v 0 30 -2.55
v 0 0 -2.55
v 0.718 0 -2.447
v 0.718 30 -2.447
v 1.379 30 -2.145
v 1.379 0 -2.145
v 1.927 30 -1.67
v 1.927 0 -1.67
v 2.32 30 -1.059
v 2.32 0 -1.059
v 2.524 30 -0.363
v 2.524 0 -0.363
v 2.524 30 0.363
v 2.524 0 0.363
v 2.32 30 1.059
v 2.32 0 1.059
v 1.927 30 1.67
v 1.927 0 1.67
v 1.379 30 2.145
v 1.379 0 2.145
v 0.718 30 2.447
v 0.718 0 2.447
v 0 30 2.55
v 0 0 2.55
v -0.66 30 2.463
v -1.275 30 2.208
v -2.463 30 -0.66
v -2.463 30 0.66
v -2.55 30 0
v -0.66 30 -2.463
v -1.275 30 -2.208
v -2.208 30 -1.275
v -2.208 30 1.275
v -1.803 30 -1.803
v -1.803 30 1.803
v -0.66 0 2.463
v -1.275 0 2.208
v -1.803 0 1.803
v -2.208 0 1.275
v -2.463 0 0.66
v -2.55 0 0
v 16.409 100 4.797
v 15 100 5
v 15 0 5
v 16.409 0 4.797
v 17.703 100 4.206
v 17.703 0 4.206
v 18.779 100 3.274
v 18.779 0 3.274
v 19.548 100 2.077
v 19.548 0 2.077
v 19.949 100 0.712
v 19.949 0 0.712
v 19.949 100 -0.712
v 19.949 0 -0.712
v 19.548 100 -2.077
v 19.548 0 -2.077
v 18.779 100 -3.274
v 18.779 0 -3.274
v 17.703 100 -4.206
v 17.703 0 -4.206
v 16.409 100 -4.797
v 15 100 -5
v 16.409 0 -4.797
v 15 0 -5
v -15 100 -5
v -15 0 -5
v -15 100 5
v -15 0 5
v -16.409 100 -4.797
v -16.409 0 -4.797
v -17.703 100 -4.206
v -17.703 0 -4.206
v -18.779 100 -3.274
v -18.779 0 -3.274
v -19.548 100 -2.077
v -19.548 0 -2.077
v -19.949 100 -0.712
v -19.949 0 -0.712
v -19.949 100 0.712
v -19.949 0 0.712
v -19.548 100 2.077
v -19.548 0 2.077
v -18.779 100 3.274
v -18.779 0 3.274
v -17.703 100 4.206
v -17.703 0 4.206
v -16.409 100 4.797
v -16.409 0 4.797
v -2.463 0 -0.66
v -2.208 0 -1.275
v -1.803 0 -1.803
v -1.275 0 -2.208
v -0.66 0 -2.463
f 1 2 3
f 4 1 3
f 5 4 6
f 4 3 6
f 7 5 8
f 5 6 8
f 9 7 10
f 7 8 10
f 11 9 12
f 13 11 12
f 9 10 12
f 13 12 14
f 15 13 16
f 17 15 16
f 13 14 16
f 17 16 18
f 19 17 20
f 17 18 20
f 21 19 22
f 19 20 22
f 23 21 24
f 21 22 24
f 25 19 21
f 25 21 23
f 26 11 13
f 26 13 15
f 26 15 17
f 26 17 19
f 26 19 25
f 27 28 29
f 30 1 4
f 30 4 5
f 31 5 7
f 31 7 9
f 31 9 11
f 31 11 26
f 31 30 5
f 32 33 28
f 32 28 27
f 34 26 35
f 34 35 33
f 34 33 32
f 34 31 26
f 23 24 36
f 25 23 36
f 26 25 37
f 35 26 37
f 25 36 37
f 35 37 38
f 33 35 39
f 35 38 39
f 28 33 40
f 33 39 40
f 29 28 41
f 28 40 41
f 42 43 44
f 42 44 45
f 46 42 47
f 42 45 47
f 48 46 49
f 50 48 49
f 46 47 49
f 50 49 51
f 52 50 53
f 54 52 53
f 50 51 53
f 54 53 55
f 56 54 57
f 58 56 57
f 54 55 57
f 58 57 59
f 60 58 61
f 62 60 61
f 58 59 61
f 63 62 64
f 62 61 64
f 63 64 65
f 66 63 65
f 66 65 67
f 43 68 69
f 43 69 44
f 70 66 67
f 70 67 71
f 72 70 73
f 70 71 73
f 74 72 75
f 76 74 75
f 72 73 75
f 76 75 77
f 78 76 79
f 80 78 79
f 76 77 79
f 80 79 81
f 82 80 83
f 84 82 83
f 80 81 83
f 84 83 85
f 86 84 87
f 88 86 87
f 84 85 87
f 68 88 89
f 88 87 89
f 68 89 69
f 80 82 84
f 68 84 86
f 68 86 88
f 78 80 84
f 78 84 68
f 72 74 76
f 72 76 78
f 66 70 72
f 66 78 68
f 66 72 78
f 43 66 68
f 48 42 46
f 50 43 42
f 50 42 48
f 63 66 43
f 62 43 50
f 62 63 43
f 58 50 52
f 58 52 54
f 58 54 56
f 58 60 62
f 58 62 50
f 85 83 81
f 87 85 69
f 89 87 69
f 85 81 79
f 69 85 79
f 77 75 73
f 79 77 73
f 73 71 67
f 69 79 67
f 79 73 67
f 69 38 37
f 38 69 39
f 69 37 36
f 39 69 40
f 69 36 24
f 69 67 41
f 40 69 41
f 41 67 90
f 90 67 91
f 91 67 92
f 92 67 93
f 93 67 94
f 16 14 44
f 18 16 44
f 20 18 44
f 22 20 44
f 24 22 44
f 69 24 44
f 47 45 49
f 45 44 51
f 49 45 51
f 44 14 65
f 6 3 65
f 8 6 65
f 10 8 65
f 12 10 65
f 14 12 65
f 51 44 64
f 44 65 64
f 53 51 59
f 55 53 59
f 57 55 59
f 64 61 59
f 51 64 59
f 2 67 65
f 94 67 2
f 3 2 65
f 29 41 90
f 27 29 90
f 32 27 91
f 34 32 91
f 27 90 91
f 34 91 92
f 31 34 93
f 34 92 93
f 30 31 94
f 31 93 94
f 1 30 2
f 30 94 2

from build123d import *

# Parameters (mm, degrees)
BOSS_EXTRUDE2_DEPTH = 100
CUT_EXTRUDE1_DEPTH  = 30


with BuildPart() as part:
    # Sketch2 → Boss-Extrude2 (new body)
    with BuildSketch(Plane(origin=(0, 0, 0), x_dir=(1, 0, 0), z_dir=(0, 1, 0))):
        with BuildLine():
            Line((-15, -5), (15, -5))
            ThreePointArc((15, -5), (20, 0), (15, 5))
            Line((15, 5), (-15, 5))
            ThreePointArc((-15, 5), (-20, 0), (-15, -5))
        make_face()
    extrude(amount=BOSS_EXTRUDE2_DEPTH)

    # Sketch3 → Cut-Extrude1 (cut)
    with BuildSketch(Plane(origin=(0, 0, 0), x_dir=(-1, 0, 0), z_dir=(0, -1, 0))):
        with BuildLine():
            ThreePointArc((2.55, 0), (1.803122292, 1.803122292), (0, 2.55))
            Line((0, 2.55), (0, -2.55))
            ThreePointArc((0, -2.55), (1.803122292, -1.803122292), (2.55, 0))
        make_face()
        with BuildLine():
            Line((0, -2.55), (0, 2.55))
            ThreePointArc((0, 2.55), (-2.55, 0), (0, -2.55))
        make_face()
    extrude(amount=-CUT_EXTRUDE1_DEPTH, mode=Mode.SUBTRACT)


solid = part.part
